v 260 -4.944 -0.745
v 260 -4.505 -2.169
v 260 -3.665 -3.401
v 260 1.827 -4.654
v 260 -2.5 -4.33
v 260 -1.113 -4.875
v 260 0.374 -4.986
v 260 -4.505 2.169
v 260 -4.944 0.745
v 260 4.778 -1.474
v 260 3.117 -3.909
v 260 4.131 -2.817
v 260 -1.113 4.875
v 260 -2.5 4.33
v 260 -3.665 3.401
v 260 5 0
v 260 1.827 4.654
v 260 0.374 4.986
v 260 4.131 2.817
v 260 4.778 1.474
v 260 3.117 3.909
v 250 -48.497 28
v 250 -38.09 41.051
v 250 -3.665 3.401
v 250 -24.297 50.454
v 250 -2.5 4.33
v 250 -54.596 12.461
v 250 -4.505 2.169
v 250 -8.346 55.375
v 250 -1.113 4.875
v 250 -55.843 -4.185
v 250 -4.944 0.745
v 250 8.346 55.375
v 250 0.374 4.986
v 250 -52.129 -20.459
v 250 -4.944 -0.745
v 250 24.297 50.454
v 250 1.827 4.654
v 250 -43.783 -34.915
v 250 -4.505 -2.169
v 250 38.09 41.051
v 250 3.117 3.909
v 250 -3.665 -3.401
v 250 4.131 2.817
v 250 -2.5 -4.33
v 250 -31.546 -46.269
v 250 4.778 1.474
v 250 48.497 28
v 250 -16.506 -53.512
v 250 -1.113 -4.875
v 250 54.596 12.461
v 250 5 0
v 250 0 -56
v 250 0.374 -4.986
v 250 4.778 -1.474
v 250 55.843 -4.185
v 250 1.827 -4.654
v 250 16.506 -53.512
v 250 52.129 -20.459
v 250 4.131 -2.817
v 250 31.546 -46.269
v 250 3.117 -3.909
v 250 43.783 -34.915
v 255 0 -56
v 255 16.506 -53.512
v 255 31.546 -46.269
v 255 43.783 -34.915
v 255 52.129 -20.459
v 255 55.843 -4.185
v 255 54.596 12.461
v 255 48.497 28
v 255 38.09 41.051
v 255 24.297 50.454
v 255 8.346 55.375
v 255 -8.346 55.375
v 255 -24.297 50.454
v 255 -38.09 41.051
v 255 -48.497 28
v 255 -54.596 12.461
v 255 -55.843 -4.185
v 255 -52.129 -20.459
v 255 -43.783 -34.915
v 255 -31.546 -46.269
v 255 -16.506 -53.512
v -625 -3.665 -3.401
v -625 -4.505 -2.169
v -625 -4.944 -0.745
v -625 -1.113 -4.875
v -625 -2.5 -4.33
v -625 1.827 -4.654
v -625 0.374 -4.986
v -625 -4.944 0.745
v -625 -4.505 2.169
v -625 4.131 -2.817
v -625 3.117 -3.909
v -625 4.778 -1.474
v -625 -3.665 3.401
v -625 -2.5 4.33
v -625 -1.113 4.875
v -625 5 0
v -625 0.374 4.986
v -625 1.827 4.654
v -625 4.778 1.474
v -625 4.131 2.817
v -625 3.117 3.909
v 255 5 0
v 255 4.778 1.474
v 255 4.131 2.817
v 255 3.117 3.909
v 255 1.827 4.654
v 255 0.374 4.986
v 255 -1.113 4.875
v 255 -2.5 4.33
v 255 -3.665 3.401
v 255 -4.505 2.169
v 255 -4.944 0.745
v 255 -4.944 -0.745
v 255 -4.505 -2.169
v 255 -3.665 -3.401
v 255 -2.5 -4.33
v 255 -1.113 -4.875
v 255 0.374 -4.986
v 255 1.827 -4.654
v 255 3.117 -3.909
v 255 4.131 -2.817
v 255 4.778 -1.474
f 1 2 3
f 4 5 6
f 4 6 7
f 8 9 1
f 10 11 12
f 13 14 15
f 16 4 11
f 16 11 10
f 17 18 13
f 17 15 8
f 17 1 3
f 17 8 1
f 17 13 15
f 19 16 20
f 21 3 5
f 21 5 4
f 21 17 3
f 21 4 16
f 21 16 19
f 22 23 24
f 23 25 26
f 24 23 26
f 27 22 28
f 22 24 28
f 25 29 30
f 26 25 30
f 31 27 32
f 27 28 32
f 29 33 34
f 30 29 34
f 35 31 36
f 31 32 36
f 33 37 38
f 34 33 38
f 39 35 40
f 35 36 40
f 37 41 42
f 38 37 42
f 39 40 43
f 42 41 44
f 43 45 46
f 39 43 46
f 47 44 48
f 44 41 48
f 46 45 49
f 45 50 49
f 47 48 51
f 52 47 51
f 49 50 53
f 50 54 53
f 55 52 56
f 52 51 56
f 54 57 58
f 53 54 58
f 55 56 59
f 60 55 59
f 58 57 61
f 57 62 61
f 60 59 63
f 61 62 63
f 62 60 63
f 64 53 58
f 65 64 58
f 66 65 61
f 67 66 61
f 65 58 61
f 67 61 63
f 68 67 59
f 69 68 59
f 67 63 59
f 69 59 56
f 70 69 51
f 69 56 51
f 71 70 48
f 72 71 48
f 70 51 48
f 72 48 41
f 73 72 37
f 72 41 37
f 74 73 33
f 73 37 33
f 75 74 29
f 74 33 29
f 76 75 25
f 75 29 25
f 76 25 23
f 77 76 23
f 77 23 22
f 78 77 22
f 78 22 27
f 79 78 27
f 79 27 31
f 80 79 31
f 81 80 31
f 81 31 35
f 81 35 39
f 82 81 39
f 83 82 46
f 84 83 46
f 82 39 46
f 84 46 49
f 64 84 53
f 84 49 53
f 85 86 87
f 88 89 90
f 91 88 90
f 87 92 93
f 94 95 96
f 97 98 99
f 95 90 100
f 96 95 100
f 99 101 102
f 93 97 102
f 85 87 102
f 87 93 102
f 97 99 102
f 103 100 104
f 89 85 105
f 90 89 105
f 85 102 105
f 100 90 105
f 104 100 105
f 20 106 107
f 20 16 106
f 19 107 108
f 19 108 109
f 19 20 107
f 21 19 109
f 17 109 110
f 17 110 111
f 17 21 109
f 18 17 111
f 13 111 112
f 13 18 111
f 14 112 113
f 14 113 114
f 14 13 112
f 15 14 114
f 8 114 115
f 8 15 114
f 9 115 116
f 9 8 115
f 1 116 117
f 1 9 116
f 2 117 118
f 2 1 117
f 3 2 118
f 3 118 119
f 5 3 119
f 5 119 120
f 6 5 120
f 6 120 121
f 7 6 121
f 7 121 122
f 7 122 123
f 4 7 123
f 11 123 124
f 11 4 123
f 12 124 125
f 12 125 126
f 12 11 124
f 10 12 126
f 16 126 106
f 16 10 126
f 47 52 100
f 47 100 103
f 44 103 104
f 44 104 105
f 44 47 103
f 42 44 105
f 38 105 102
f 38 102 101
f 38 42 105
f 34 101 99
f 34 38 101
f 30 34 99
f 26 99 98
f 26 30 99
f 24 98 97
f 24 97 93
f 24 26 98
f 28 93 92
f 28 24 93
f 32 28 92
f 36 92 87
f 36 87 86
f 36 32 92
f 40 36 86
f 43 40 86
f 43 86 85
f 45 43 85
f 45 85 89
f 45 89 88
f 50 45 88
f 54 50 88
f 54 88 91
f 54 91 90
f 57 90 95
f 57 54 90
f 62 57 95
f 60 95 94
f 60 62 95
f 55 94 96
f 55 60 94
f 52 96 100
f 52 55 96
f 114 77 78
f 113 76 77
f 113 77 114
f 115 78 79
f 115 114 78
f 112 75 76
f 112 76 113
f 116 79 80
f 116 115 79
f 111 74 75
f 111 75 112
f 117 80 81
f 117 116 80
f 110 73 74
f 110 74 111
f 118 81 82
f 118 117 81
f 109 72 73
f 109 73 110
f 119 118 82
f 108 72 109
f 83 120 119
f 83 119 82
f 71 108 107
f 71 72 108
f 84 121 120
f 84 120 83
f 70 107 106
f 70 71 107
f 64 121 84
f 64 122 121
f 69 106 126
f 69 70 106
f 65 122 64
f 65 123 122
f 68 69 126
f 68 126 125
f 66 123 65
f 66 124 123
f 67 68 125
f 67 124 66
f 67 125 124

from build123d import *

# Parameters (mm, degrees)
CYLINDER001_R           = 56
CYLINDER001_DEPTH       = 5
CYLINDER001_PITCH_ANGLE = 90
SKETCH002_R             = 5
PAD001_DEPTH            = 10
PAD001_DEPTH_BACK       = 875


with BuildPart() as flange_for_rod001:
    # Cylinder001 → Cylinder001 (new body)
    with BuildSketch(Plane.XY):
        Circle(CYLINDER001_R)
    extrude(amount=CYLINDER001_DEPTH)


with BuildPart() as flange_for_rod001_1:
    # Cylinder001 pitch: moved
    add(flange_for_rod001.part.rotate(Axis((0, 0, 0), (0, 1, 0)), CYLINDER001_PITCH_ANGLE))


with BuildPart() as flange_for_rod001_2:
    # Cylinder001 placement: moved
    add(flange_for_rod001_1.part)


with BuildPart() as rod_flange001:
    # Sketch002 → Pad001 (new body, two sides)
    with BuildSketch(Plane.YZ) as pad001_sk:
        Circle(SKETCH002_R)
    extrude(amount=PAD001_DEPTH)
    extrude(pad001_sk.sketch, amount=-PAD001_DEPTH_BACK)

    # Fusion001: union Flange_for_Rod001
    add(flange_for_rod001_2.part)


with BuildPart() as rod_flange001_1:
    # Fusion001 placement: moved
    add(rod_flange001.part.moved(Location((250, 0, 0))))


solid = rod_flange001_1.part
